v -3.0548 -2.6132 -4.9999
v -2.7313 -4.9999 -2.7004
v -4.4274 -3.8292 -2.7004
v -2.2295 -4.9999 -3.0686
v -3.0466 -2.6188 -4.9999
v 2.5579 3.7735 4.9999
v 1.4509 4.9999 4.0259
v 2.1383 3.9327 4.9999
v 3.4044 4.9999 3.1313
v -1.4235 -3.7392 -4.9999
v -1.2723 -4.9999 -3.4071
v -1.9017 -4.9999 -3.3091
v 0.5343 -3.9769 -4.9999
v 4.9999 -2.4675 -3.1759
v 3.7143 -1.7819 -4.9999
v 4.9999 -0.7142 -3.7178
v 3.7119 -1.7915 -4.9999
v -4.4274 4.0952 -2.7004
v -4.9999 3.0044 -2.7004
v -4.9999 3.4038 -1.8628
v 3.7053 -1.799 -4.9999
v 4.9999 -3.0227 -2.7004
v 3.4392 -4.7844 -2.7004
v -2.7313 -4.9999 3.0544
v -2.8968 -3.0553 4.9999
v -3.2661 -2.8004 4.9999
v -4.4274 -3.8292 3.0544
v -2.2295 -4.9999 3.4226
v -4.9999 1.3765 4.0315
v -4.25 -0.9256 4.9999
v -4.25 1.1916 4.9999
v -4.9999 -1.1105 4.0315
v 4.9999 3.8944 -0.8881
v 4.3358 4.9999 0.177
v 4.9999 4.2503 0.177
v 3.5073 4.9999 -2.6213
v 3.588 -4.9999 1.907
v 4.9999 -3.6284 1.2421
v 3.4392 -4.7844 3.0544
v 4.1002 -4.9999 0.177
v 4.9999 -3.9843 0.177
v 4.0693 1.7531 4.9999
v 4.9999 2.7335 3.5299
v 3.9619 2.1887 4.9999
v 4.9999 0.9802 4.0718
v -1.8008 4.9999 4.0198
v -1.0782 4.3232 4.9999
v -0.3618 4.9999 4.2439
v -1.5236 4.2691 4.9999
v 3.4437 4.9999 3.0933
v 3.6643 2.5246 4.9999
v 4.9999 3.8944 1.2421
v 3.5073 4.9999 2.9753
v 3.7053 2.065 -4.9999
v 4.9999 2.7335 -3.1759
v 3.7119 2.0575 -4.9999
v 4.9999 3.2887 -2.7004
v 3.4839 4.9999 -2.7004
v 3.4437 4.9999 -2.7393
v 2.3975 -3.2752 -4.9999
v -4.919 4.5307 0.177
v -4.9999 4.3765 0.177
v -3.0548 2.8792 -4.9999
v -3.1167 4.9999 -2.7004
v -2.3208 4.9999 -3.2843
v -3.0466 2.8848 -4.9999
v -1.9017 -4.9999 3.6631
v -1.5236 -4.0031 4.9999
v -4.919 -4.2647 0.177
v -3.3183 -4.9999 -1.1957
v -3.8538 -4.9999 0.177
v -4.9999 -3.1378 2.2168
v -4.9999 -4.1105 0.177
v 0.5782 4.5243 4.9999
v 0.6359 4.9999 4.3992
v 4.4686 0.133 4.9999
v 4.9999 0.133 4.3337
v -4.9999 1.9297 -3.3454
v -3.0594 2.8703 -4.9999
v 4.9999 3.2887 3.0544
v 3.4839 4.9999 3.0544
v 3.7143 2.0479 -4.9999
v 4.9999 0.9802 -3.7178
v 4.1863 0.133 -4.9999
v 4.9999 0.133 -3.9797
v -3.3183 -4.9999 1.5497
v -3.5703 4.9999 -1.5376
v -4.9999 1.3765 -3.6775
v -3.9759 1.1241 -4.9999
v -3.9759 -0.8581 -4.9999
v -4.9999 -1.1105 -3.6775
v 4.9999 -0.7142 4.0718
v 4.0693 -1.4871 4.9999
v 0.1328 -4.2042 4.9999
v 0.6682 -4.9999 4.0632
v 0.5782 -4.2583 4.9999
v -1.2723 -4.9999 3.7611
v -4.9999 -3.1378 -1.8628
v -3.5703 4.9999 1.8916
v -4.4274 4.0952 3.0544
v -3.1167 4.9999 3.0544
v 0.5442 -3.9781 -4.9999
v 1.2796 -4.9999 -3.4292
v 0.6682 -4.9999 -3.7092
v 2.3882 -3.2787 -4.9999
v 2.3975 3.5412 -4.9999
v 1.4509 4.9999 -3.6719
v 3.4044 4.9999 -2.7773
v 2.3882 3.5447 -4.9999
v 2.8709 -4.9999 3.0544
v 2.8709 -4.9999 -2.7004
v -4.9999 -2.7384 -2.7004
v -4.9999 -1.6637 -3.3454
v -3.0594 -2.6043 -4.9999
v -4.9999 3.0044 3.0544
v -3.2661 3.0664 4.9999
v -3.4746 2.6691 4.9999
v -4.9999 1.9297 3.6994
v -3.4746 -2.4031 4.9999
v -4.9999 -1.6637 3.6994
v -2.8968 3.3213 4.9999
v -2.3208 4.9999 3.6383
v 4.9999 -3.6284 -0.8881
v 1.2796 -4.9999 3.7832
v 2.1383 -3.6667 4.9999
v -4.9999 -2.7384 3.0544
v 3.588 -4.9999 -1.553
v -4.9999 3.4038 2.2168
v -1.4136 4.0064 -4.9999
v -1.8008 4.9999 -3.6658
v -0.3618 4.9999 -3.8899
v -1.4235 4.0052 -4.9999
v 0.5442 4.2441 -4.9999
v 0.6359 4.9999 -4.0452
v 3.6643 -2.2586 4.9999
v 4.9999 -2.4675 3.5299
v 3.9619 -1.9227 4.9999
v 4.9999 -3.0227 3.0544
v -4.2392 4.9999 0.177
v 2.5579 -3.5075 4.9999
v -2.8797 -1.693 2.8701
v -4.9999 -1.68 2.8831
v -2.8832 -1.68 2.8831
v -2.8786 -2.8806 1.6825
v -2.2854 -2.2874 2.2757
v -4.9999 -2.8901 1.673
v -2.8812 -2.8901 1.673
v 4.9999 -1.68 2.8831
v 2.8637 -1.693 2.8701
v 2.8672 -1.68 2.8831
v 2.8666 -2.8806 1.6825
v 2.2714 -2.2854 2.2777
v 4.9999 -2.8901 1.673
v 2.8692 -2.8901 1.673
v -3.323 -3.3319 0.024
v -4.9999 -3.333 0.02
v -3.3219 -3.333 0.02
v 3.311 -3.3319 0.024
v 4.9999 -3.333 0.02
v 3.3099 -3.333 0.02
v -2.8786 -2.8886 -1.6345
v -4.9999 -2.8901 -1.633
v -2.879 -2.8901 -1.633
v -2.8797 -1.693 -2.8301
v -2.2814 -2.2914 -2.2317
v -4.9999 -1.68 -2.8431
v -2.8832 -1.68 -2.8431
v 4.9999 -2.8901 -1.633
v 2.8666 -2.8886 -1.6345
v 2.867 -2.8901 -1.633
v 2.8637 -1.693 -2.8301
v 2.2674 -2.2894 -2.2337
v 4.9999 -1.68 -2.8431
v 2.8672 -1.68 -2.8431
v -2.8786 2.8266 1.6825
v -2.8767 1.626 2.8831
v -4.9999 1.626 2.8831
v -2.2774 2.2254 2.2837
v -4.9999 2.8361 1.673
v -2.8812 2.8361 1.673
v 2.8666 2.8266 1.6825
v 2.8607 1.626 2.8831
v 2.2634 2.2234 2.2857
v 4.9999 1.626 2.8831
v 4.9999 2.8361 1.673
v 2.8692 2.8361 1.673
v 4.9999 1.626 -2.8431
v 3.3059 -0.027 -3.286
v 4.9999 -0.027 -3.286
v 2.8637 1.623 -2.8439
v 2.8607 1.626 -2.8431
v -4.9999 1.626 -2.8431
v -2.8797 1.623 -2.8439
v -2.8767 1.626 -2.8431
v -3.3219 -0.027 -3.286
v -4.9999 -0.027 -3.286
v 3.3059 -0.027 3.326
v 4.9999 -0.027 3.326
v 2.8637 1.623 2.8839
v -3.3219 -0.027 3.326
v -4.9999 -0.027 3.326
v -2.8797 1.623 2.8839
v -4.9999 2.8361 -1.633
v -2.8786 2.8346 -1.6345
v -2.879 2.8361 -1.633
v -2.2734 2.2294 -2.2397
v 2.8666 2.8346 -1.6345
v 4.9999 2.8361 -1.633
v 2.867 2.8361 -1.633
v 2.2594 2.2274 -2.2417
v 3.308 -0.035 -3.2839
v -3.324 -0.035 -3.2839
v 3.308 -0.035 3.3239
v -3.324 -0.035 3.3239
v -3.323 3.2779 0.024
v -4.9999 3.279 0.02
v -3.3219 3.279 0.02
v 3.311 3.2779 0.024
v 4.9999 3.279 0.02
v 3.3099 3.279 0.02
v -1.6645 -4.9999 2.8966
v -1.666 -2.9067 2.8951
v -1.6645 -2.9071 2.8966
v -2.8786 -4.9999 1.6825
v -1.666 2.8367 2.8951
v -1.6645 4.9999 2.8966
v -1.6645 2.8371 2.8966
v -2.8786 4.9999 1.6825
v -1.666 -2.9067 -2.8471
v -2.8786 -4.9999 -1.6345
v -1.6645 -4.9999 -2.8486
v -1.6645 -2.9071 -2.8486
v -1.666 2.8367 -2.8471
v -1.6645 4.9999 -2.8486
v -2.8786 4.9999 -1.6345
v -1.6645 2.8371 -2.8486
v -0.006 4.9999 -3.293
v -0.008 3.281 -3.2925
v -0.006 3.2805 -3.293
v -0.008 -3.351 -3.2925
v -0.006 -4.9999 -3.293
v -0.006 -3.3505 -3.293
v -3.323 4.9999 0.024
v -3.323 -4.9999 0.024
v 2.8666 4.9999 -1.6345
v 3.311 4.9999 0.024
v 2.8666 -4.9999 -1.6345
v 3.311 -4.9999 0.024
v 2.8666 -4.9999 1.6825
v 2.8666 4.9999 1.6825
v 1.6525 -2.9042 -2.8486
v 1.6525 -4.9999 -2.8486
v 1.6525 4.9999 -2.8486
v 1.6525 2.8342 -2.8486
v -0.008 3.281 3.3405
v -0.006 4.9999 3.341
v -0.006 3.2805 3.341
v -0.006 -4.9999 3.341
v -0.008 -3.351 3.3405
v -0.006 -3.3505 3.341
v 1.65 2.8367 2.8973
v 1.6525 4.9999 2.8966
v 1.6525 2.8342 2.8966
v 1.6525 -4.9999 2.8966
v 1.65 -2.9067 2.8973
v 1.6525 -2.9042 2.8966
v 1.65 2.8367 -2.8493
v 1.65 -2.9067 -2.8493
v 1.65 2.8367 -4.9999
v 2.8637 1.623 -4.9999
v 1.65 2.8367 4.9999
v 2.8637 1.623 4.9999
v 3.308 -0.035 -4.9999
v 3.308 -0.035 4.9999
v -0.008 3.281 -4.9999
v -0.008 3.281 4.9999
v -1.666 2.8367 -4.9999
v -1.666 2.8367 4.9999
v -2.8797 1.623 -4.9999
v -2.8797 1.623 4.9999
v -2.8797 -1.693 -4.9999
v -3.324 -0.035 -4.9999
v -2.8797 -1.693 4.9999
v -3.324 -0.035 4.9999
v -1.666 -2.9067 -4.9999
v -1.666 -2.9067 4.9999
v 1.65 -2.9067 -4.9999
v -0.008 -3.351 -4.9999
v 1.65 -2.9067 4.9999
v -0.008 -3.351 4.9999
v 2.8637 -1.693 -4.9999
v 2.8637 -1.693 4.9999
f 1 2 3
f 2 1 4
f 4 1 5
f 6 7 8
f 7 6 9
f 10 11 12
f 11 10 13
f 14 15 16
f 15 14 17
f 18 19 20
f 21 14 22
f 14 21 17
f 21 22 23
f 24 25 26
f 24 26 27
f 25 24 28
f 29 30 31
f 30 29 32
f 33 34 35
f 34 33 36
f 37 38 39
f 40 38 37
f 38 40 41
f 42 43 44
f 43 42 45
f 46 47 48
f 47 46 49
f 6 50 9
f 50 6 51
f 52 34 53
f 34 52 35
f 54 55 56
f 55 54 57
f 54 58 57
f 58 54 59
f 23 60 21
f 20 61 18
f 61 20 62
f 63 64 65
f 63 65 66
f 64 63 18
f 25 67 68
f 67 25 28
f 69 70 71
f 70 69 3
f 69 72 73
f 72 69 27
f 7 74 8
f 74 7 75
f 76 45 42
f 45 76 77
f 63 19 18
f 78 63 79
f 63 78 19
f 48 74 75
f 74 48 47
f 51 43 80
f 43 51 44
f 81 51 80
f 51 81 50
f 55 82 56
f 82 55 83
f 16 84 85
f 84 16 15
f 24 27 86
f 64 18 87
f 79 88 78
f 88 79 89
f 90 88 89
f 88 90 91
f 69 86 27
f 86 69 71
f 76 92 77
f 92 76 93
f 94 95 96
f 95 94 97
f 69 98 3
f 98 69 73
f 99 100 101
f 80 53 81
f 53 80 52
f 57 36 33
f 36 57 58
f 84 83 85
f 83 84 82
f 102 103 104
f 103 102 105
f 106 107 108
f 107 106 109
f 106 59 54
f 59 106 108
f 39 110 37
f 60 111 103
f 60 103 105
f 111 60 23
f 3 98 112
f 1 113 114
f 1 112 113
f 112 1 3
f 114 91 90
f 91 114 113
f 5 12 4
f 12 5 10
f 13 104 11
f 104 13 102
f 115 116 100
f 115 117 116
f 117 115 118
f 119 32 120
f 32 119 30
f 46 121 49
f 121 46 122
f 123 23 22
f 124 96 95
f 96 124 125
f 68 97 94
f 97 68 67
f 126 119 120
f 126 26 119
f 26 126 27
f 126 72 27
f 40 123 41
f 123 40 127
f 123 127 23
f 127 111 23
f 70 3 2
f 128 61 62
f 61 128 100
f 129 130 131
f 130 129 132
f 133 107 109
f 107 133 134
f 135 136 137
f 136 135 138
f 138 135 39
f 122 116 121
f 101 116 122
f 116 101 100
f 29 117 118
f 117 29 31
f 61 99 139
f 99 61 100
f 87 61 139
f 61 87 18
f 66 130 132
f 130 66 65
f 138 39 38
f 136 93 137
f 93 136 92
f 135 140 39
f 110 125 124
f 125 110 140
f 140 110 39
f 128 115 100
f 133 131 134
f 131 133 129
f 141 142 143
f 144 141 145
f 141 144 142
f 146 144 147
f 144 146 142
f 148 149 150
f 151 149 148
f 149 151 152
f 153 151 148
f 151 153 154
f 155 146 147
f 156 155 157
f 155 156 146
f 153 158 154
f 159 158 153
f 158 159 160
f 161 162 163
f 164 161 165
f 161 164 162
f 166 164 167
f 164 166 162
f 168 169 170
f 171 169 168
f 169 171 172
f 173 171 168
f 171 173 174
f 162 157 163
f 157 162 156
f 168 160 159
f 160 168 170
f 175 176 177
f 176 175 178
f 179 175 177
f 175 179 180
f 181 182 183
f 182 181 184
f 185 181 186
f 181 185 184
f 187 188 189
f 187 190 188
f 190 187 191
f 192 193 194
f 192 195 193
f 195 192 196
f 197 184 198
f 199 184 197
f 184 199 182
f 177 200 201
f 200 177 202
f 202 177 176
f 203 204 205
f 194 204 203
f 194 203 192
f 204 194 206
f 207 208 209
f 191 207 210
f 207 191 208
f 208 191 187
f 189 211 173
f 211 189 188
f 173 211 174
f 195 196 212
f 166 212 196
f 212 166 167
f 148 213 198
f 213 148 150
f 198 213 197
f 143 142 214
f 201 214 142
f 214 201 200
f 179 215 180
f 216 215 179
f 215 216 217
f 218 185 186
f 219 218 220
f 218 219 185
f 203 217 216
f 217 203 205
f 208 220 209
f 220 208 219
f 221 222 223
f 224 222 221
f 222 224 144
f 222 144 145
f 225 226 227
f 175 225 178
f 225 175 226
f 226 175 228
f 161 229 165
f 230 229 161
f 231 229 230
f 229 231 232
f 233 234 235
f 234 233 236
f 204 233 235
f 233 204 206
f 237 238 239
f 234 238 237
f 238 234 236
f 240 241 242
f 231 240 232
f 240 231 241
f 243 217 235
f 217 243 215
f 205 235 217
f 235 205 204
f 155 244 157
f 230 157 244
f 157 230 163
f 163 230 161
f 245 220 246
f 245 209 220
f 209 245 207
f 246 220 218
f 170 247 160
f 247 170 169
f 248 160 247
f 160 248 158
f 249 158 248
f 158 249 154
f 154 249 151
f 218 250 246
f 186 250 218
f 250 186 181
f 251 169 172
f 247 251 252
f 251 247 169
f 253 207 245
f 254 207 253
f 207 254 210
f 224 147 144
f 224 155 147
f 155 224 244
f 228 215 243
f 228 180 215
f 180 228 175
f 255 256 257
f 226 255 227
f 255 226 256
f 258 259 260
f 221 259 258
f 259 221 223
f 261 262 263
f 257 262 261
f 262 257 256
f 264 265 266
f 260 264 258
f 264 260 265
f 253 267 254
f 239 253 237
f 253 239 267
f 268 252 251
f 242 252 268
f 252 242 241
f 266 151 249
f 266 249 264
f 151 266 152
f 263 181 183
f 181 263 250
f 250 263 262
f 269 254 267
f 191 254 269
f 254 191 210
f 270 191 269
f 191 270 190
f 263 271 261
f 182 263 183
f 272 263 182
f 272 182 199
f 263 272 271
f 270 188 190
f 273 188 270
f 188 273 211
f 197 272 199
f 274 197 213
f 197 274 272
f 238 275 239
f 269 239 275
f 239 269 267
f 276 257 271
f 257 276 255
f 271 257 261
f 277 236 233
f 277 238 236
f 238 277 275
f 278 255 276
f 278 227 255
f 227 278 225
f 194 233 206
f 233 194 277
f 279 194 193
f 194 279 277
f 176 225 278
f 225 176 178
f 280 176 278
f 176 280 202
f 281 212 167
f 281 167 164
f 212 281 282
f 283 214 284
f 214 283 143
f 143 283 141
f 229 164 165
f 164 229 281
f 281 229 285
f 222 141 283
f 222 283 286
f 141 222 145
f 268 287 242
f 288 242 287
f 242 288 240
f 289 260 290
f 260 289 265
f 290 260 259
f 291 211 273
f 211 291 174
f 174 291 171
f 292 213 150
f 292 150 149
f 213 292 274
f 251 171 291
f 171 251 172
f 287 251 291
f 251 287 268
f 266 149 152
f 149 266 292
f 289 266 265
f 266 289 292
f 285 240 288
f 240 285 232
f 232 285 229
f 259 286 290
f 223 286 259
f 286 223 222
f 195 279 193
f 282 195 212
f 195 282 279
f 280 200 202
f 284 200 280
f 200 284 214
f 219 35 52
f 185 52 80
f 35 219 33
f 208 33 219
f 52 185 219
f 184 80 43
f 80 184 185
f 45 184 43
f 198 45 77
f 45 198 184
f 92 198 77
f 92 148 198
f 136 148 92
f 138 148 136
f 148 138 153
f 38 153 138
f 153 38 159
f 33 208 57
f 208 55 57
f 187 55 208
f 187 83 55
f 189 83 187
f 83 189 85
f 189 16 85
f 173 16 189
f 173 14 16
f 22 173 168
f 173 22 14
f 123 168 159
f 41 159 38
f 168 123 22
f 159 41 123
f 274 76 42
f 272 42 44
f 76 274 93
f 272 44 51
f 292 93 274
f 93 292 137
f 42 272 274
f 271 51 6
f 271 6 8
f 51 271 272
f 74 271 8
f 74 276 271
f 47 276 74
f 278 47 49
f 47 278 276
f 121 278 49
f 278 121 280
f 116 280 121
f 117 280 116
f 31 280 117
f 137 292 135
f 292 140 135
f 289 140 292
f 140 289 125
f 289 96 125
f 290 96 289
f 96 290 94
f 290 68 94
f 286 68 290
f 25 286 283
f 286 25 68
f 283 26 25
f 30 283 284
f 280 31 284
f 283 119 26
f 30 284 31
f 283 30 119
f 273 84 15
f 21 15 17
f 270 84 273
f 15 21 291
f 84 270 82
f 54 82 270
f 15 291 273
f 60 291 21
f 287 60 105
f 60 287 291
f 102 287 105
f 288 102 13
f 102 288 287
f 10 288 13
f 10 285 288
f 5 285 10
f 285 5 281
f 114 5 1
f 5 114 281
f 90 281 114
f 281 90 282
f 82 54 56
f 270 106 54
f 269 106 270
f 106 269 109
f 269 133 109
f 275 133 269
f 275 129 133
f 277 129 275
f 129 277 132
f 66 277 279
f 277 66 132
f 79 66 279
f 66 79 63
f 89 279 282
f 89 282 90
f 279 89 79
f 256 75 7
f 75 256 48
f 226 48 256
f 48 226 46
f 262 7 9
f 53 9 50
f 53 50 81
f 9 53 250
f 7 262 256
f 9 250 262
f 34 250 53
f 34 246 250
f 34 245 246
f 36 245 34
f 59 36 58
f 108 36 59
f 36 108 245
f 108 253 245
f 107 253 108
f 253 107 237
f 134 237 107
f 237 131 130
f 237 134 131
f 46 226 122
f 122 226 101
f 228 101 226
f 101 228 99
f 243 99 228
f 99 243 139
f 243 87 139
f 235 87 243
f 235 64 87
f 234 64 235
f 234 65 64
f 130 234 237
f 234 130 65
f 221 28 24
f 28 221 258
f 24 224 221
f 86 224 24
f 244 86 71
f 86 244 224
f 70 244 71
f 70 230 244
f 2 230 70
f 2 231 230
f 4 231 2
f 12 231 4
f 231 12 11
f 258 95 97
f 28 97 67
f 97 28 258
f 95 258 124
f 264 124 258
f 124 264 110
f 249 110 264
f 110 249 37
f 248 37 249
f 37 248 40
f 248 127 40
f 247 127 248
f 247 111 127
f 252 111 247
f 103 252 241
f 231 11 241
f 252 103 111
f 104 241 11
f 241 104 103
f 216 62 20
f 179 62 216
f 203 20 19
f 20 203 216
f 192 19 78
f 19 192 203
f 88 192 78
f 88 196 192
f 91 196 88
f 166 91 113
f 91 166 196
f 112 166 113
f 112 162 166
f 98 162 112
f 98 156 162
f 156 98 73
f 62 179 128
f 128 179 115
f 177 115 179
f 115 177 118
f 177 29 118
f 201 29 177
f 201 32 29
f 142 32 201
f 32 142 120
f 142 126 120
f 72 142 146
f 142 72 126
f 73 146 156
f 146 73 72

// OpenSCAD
intersection() {
  cube(size = [11.9998, 11.9998, 11.9998], center = true);

  union() {
    intersection() {
      translate([-6.75, 0, 0])
      cube(size = [23.4998, 9.9998, 9.9998], center = true);
    
      union() {
        sphere(r = 55.4998, $fn = 111);
      
        translate([0.045, 0.133, 0.177])
        sphere(r = 6.6318, $fn = 13);
      }
    
      difference() {
        union() {
          translate([0.045, 0.133, 0.177])
          sphere(r = 6.6318, $fn = 13);
        
          translate([-0.006, 6.75, 0.024])
          rotate([180, 90, -90])
          cylinder(h = 23.4998, r1 = 3.317, r2 = 3.317, center = true, $fn = 12);
        }
      
        union() {
          translate([0, -0.027, 0.02])
          rotate([180, 90, 180])
          cylinder(h = 9.9999, r1 = 3.306, r2 = 3.306, center = true, $fn = 12);
        
          translate([-0.006, -6.75, 0.024])
          rotate([180, 90, -90])
          cylinder(h = 23.4999, r1 = 3.317, r2 = 3.317, center = true, $fn = 12);
        }
      }
    
      difference() {
        translate([0.045, 0.133, 0.177])
        sphere(r = 6.6318, $fn = 13);
      
        intersection() {
          sphere(r = 55.4999, $fn = 111);
        
          translate([-0.008, -0.035, -6.75])
          cylinder(h = 23.4999, r1 = 3.316, r2 = 3.316, center = true, $fn = 12);
        }
      }
    
      translate([6.75, 0, 0])
      cube(size = [23.4998, 9.9998, 36.9998], center = true);
    }
  
    intersection() {
      union() {
        translate([-0.008, -0.035, 11.75])
        cylinder(h = 13.4998, r1 = 3.316, r2 = 3.316, center = true, $fn = 12);
      
        translate([0, -11.75, 11.75])
        cube(size = [36.9998, 13.4998, 13.4998], center = true);
      }
    
      translate([0, 6.75, -6.75])
      cube(size = [36.9998, 23.4998, 23.4998], center = true);
    }
  }
}
